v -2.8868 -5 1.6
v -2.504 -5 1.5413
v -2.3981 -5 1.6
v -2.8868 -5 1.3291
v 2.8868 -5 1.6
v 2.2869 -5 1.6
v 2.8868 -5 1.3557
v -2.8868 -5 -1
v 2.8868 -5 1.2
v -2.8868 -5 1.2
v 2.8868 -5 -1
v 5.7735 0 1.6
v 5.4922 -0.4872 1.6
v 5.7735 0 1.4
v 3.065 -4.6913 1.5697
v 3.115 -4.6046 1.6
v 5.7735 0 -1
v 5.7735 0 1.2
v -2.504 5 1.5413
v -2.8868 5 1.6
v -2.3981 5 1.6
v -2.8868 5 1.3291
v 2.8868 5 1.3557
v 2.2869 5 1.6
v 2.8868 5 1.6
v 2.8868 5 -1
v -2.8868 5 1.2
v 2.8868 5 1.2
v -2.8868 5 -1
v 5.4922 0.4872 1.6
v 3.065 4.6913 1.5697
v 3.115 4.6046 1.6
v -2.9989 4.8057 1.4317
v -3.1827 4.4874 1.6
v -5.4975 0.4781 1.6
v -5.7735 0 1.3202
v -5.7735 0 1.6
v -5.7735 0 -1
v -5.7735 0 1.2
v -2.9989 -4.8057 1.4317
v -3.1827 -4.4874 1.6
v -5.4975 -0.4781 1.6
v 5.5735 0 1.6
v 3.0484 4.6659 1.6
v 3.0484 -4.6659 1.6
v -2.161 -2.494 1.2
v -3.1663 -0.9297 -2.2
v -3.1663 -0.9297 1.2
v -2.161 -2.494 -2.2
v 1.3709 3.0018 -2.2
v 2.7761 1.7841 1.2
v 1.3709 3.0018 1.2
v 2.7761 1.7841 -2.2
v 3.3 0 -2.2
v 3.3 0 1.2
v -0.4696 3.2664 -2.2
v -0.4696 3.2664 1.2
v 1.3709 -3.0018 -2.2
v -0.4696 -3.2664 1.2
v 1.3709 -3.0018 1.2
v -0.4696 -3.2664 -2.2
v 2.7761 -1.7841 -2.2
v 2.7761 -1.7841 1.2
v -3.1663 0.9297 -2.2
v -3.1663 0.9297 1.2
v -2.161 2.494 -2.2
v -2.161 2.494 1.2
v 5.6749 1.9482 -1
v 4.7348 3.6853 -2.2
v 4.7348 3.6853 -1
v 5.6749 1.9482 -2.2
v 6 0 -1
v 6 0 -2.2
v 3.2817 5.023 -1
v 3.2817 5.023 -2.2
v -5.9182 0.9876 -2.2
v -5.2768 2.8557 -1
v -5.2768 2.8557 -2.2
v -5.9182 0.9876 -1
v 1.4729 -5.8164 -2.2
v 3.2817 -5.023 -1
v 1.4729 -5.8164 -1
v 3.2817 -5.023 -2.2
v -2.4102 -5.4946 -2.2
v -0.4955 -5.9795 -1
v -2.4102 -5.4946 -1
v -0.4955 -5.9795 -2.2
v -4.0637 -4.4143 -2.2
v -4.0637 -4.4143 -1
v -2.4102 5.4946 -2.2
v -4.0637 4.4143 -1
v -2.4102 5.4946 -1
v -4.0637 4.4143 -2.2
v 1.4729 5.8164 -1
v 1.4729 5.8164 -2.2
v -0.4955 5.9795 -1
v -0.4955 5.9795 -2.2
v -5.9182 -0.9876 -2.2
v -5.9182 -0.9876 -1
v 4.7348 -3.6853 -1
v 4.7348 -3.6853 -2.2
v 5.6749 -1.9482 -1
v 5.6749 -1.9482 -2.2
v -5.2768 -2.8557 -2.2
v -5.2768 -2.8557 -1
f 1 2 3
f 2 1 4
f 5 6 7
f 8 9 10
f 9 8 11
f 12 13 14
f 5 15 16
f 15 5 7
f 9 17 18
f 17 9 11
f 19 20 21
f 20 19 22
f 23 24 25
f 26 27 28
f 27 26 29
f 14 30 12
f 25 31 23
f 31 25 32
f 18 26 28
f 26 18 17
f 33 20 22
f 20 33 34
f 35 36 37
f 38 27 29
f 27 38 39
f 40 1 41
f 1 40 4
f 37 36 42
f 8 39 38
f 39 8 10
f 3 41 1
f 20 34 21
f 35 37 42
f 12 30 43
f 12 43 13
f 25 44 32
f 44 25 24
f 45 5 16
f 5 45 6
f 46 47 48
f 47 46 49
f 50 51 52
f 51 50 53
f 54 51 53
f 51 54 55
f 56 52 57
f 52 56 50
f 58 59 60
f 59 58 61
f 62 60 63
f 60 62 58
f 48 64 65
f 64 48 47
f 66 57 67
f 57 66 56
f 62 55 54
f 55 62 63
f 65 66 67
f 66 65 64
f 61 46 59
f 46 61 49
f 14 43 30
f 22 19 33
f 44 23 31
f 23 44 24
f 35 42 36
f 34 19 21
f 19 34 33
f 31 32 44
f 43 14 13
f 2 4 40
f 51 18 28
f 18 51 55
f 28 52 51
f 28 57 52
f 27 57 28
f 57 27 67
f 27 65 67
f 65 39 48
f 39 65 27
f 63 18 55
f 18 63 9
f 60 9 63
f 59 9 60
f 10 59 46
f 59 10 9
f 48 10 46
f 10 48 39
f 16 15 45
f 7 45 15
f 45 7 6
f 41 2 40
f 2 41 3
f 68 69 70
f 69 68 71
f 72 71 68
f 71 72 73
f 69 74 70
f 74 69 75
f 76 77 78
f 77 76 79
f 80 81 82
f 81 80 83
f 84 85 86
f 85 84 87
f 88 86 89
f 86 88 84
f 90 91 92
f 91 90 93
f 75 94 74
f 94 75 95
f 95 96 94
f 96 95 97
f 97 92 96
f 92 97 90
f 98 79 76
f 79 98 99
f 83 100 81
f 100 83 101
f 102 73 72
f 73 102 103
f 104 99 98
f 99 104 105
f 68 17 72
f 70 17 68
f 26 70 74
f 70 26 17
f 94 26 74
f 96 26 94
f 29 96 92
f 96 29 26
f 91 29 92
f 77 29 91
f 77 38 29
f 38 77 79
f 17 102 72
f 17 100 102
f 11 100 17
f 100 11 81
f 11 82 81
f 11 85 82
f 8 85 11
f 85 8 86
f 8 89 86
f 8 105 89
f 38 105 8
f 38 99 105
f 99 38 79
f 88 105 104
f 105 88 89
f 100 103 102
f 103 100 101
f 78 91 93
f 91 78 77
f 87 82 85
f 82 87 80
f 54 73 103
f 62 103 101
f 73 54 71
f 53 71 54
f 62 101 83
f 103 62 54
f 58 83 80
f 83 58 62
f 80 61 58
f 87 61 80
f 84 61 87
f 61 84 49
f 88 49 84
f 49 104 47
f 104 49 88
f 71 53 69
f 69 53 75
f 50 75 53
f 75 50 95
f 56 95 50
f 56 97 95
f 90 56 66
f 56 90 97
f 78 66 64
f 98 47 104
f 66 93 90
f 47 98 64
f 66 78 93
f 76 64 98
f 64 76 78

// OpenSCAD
// Parameters
thread_diameter = 6; //[3:12:0.1]
across_flats = 10; //[5:20:0.1]
thickness = 3.2; //[1.6:6.4:0.1]
hole_diameter = 6.6; //[5.5:7.5:0.05]
edge_break_size = 0.2; //[0.1:0.6:0.05]
overlap = 0.6; //[0.2:2:0.1]
washer_outer_diameter = 12; //[8:24:0.1]
washer_thickness = 1.2; //[0.6:2.4:0.1]

// Hexagonal Nut with Chamfer
module hex_nut() {
  difference() {
    // Hex Nut Body
    cylinder(h=thickness, r=across_flats/(2*cos(30)), center=true, $fn=6);
    // Thread Hole
    translate([0, 0, 0])
      cylinder(h=thickness + 2*overlap, r=hole_diameter/2, center=true);
    // Chamfer Top
    translate([0, 0, thickness/2 - edge_break_size])
      cylinder(h=2*edge_break_size, r1=across_flats/(2*cos(30)) + edge_break_size, r2=across_flats/(2*cos(30)) - edge_break_size, center=true);
    // Chamfer Bottom
    translate([0, 0, -thickness/2 + edge_break_size])
      cylinder(h=2*edge_break_size, r1=across_flats/(2*cos(30)) - edge_break_size, r2=across_flats/(2*cos(30)) + edge_break_size, center=true);
  }
}

// Washer
module washer() {
  difference() {
    // Washer Outer
    translate([0, 0, -(thickness/2 + washer_thickness/2 - overlap)])
      cylinder(h=washer_thickness, r=washer_outer_diameter/2, center=true);
    // Washer Hole
    translate([0, 0, -(thickness/2 + washer_thickness/2 - overlap)])
      cylinder(h=washer_thickness + 2*overlap, r=hole_diameter/2, center=true);
  }
}

// Nut and Washer Assembly
module nut_and_washer() {
  union() {
    hex_nut();
    washer();
  }
}

// Final Assembly
module assembly() {
  nut_and_washer();
}

assembly();
